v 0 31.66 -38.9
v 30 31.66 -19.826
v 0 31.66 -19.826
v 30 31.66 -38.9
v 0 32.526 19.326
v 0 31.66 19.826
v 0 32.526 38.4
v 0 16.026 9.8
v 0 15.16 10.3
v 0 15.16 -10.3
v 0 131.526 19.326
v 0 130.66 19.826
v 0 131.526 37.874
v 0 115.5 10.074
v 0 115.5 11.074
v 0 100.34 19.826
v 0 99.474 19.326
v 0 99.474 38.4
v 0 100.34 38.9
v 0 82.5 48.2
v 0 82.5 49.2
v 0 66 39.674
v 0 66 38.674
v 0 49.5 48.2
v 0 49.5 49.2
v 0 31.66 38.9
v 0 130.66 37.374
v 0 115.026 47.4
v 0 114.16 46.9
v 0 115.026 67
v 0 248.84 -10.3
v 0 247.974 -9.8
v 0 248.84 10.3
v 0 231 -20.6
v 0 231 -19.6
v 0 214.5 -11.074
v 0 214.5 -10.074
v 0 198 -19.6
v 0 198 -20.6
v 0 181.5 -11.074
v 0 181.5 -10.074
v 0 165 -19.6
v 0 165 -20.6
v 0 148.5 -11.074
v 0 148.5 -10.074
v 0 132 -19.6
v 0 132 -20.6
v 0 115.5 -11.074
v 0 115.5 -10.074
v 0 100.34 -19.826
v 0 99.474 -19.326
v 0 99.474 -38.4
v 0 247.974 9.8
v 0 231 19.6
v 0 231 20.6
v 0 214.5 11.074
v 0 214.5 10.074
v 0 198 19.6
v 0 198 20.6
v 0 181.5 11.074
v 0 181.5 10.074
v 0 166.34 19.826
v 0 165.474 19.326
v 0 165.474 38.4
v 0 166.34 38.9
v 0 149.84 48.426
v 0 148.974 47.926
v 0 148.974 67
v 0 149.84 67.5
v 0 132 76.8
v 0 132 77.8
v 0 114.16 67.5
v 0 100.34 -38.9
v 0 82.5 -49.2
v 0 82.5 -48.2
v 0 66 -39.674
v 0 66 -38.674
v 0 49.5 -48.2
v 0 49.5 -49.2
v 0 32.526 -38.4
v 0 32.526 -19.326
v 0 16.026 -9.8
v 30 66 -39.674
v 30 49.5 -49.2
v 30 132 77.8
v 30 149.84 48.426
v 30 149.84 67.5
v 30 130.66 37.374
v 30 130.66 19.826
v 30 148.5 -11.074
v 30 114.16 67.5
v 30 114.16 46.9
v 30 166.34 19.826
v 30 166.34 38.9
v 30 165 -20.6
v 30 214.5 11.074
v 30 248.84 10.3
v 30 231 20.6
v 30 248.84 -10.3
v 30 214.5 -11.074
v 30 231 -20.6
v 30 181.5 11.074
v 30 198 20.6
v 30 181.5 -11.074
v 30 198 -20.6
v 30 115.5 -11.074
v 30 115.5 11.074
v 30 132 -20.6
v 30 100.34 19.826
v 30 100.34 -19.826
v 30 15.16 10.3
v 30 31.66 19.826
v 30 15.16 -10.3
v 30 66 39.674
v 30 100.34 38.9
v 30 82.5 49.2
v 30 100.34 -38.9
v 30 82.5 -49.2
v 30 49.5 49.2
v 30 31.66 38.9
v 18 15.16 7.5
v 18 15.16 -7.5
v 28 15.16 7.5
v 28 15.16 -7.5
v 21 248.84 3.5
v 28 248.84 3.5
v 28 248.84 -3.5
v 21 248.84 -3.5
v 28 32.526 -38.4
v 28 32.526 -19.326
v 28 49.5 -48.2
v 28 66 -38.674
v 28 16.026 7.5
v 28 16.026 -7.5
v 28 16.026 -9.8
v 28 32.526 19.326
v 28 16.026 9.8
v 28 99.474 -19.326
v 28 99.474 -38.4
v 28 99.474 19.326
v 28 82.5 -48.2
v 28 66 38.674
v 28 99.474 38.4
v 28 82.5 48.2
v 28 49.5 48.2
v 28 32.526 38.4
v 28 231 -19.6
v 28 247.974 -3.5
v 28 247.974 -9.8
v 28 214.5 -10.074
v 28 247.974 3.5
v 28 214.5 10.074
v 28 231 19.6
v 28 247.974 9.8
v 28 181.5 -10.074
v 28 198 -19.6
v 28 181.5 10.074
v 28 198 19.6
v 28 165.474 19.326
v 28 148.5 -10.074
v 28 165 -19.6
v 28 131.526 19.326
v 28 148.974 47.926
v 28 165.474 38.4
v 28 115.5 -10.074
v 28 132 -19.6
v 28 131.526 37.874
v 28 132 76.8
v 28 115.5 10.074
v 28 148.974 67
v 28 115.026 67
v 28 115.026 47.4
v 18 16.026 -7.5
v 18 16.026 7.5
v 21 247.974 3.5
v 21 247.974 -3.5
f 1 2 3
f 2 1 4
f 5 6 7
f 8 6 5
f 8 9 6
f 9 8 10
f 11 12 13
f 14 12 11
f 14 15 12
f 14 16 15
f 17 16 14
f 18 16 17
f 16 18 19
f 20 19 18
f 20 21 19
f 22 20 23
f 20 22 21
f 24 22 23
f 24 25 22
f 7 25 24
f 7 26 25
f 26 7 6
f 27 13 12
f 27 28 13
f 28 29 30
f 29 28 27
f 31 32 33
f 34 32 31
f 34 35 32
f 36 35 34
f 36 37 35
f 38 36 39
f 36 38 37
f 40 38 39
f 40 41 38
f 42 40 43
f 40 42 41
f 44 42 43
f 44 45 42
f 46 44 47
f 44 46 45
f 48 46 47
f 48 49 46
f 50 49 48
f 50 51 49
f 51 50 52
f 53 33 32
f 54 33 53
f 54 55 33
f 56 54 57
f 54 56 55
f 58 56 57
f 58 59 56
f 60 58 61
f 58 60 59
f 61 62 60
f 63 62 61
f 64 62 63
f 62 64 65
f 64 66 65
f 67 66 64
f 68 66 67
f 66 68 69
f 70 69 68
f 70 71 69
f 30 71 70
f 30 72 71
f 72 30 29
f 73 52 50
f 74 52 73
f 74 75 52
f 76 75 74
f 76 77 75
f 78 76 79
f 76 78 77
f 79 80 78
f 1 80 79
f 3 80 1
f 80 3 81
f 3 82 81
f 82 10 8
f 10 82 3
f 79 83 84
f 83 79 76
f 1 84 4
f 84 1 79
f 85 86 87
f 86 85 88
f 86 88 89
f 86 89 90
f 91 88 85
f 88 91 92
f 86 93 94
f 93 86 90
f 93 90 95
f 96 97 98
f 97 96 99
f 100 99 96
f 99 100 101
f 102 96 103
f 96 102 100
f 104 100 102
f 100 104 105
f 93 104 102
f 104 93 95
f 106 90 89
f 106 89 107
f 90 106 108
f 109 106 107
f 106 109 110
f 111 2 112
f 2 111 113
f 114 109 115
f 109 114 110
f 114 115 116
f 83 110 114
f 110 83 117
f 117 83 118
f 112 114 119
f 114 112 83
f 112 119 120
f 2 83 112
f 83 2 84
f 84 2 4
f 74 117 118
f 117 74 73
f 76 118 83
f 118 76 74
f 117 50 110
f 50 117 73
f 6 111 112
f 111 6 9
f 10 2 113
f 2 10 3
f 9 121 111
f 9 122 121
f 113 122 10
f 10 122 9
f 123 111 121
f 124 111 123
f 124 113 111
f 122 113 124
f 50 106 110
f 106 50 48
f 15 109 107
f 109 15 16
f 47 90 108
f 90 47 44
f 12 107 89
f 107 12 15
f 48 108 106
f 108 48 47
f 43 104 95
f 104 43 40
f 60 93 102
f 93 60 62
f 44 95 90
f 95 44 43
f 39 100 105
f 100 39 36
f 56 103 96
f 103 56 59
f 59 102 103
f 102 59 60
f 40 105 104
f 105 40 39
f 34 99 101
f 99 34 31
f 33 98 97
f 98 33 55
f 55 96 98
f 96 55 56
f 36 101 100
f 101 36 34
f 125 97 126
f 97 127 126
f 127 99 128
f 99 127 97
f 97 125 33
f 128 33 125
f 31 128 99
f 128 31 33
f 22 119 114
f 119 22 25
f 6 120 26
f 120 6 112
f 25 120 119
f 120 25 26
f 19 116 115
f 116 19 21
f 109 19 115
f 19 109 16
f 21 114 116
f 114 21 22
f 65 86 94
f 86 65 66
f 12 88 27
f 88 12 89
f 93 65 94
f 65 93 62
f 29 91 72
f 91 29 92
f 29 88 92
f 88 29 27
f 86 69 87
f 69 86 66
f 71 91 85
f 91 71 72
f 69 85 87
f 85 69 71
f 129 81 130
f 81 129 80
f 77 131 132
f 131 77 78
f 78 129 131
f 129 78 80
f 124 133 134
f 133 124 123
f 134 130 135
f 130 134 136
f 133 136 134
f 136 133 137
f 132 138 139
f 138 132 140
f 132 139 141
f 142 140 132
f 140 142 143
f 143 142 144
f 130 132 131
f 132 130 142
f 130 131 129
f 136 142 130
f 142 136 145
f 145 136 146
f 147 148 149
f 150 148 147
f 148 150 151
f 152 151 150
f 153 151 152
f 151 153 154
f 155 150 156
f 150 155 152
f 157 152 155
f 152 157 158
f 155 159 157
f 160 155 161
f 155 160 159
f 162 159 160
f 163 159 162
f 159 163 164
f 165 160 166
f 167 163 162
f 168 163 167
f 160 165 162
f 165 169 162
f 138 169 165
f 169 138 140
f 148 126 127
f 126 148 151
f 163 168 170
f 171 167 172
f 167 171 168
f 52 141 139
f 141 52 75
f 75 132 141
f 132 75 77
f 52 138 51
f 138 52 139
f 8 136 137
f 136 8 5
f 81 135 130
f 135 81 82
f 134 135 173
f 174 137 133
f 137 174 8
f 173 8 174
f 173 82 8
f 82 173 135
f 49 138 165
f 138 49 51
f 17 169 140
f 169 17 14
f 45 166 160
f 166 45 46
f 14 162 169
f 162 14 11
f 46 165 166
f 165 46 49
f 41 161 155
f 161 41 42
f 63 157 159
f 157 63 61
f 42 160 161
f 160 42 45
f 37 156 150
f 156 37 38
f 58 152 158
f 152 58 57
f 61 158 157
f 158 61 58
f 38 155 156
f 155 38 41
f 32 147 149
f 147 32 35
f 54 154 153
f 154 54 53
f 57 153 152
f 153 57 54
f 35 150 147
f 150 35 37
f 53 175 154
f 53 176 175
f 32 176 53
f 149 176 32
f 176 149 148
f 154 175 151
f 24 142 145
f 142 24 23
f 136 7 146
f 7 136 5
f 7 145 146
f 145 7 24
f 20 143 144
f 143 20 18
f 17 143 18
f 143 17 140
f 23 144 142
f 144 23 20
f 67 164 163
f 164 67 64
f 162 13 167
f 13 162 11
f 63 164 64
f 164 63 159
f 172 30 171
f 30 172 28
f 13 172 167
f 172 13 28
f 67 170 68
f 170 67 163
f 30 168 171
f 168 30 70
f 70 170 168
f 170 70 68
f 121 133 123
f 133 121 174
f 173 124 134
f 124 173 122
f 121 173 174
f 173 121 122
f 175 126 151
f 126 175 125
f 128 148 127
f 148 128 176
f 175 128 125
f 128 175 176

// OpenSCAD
$fn=200;

// radius for hex
br=18.8;

// height for hex
bh=10;
bhh=0.9;

// Distance between 2 hexes
dist=33;
offx=32;
offy=24;

board();

module draw_flower(height, radius) {
    draw_line_extra(-1,2, 3, height, radius);
    draw_line_extra(0,1, 7, height, radius);
    draw_line_extra(1,1,2, height, radius);

    draw_line_extra(1,4, 4, height, radius);
    draw_line_extra(2,4, 4, height, radius);
}


module draw_line_extra(j, start, end, height, radius) {
    for ( i = [start : end] ){
        translate([0,i*dist+(dist/2*(j%2)),j*28.6]) rotate([0,90,0]) {
            cylinder(r=radius,h=height, $fn=6);
        }
    }
}

        

module board() {
    difference() {
        draw_flower(30, br+0.8+1);

        translate([-1,0,0]) draw_flower(29, br+0.8);
        
        translate([28-10,0,-15/2]) cube([10,50,15]);        
        translate([31-10,0,-7/2]) cube([7,1000,7]);        

    }
}
